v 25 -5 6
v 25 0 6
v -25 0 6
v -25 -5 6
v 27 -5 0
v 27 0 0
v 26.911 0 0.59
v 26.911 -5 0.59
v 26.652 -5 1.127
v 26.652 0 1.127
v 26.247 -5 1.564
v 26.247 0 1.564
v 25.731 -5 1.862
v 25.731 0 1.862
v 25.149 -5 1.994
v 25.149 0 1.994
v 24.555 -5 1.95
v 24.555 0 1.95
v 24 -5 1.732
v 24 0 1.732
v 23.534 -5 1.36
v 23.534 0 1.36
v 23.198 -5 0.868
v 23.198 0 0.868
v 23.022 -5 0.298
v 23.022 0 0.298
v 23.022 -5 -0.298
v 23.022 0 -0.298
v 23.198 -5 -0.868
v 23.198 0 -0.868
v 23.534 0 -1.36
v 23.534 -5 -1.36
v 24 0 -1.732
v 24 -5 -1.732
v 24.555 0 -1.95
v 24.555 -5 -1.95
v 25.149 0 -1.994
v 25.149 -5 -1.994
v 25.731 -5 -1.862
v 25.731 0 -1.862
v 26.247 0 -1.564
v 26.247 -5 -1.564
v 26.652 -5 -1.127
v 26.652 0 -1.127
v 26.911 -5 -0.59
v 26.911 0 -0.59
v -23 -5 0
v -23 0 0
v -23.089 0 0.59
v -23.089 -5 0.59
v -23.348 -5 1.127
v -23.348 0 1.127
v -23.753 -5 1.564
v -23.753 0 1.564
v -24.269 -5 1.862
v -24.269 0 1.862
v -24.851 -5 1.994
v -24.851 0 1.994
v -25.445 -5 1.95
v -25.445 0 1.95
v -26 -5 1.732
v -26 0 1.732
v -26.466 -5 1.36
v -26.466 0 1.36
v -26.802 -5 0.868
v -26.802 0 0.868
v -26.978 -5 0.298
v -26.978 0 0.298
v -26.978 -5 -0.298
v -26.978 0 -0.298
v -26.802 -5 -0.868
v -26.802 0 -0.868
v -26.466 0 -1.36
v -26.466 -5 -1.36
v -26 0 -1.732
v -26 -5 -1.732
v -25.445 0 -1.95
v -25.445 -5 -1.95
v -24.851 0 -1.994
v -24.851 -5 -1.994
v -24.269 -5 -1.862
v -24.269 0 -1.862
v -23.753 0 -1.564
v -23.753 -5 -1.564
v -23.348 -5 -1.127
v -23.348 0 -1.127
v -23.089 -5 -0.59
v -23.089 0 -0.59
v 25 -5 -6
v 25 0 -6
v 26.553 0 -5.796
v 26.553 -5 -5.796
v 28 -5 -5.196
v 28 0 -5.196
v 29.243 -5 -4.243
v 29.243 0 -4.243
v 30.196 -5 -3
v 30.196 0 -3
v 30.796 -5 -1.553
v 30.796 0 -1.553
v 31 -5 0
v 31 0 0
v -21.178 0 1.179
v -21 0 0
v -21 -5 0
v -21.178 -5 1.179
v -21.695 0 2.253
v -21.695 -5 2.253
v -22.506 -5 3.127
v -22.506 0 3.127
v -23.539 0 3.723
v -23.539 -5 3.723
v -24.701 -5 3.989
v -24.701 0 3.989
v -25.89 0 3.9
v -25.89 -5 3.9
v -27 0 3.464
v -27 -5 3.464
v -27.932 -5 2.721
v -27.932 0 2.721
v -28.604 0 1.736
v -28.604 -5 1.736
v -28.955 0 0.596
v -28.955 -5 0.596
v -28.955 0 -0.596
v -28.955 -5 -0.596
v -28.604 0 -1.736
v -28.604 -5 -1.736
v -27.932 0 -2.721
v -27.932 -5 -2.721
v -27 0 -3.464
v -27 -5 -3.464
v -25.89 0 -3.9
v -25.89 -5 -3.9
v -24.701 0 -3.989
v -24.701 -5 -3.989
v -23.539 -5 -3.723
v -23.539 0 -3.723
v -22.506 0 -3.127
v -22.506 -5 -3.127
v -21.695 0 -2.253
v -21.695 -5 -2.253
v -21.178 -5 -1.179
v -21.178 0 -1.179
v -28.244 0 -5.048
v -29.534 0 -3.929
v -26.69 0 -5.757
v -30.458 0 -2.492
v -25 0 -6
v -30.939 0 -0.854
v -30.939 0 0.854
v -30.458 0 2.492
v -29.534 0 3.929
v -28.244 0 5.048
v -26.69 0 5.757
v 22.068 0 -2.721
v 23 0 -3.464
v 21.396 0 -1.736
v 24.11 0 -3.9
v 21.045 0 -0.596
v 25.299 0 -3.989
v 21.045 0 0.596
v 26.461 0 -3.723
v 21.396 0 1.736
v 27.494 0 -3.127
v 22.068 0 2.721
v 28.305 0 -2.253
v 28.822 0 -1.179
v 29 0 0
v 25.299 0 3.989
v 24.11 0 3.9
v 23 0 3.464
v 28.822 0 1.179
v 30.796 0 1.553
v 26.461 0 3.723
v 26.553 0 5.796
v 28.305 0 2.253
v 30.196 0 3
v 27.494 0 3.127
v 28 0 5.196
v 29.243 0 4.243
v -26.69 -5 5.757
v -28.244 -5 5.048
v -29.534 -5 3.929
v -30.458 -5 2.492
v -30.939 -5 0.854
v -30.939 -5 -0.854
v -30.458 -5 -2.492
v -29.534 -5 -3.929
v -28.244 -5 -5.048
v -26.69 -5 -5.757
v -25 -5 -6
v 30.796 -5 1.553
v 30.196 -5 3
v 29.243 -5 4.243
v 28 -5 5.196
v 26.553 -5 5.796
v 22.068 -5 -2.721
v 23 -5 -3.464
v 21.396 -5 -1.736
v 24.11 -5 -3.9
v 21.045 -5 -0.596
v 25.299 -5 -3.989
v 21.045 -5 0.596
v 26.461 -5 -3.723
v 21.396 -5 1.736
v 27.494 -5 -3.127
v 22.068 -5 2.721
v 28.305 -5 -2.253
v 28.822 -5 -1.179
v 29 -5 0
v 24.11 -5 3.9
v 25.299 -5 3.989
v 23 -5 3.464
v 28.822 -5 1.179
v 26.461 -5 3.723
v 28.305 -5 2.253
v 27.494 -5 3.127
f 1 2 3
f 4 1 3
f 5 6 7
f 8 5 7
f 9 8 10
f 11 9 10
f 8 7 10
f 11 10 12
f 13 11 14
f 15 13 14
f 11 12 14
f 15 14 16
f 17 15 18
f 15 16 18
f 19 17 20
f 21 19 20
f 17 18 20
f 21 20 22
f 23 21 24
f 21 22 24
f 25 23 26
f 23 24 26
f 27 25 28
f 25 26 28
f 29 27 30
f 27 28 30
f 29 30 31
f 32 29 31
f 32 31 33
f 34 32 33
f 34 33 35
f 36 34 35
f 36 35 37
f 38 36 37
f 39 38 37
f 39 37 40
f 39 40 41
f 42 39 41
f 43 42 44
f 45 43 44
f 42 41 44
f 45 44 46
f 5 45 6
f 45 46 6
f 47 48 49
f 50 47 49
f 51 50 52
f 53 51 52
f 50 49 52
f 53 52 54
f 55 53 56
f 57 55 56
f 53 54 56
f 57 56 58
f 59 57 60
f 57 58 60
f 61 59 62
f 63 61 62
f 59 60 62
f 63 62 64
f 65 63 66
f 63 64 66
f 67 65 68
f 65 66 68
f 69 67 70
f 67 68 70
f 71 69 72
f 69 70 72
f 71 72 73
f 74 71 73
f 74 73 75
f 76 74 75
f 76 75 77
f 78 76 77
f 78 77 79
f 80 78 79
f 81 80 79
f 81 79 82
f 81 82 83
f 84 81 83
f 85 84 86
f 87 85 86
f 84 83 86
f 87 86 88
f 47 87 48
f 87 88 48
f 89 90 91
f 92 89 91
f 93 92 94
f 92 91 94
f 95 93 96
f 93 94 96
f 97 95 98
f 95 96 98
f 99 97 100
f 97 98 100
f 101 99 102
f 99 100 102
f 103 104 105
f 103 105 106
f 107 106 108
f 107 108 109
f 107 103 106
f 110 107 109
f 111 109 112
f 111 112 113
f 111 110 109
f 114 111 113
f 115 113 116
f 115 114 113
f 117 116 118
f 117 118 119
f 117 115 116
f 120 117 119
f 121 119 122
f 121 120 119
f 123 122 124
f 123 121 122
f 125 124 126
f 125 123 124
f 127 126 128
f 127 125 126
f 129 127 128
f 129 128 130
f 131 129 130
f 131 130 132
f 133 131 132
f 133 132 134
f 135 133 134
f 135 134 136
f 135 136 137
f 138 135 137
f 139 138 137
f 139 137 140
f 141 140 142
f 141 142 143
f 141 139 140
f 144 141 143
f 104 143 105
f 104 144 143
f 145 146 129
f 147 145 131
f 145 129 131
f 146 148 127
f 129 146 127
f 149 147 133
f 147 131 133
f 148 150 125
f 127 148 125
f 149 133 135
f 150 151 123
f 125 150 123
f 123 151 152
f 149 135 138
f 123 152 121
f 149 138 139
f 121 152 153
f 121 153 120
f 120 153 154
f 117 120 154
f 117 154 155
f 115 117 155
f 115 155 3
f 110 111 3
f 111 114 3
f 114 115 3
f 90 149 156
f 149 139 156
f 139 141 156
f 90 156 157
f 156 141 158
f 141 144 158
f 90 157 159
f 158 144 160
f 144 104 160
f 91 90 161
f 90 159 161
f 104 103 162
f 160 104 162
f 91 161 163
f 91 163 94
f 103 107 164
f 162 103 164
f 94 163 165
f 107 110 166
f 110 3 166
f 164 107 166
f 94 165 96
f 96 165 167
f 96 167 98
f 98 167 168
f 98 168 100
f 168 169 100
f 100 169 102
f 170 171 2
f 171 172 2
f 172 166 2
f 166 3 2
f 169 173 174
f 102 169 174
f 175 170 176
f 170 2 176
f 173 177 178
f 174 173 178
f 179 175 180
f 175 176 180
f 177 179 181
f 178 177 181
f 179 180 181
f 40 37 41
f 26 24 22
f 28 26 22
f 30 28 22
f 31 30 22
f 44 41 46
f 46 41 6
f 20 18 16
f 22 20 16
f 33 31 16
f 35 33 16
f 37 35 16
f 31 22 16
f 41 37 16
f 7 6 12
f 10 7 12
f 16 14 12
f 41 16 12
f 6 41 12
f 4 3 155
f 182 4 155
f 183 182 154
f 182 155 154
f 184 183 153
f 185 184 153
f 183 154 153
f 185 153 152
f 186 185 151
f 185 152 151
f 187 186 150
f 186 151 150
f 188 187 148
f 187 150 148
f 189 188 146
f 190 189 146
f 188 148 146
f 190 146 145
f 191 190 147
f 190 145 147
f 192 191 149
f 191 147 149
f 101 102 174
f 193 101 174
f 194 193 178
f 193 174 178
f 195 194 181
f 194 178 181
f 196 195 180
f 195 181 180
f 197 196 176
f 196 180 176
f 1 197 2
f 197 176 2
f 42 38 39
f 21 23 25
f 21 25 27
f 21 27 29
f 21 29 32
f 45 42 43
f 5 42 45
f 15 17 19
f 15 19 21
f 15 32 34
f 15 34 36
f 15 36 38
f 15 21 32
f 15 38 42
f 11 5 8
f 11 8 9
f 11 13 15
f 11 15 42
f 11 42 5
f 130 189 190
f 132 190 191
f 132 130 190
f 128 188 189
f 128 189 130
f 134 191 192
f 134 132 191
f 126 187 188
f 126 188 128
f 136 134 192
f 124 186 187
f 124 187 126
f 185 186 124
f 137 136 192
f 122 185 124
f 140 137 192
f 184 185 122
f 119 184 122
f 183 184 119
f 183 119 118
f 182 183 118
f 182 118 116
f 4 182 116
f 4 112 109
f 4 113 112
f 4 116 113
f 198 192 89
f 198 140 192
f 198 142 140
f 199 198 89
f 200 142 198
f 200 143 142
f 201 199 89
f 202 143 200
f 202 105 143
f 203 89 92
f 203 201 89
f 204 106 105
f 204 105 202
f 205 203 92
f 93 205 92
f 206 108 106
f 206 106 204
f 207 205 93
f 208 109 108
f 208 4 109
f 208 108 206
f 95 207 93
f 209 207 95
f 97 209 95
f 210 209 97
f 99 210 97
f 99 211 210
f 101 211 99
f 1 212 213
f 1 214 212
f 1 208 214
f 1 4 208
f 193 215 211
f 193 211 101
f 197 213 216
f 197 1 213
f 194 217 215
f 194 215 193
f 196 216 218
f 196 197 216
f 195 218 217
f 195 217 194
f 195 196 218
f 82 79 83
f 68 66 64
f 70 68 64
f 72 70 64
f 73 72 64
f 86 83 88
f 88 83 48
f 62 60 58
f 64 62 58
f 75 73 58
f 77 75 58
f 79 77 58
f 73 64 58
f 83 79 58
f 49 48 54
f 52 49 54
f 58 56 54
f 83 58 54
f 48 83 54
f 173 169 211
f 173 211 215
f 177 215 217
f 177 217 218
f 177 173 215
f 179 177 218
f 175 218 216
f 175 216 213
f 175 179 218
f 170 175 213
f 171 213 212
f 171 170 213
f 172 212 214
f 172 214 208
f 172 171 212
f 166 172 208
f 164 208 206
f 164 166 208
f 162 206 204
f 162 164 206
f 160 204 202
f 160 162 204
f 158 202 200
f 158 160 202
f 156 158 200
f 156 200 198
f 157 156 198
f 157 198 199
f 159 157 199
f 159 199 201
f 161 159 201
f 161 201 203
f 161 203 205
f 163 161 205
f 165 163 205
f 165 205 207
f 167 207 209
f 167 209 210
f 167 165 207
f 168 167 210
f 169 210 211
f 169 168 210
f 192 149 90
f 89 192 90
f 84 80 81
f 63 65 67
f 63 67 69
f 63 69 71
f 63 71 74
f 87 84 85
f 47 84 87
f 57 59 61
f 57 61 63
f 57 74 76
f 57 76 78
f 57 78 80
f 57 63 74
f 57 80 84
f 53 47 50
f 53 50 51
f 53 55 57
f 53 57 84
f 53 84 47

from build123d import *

# Parameters (mm, degrees)
F0_R     = 4
F1_DEPTH = 5
F0_R_2   = 2


with BuildPart() as f1:
    # F0 (on Front) → F1 (new body)
    with BuildSketch(Plane.XZ):
        with BuildLine():
            ThreePointArc((-25, 6), (-20.7573593129, 4.2426406871), (-19, 0))
            ThreePointArc((-19, 0), (-20.7573593129, -4.2426406871), (-25, -6))
            Line((-25, -6), (0, -6))
            Line((0, -6), (25, -6))
            ThreePointArc((25, -6), (19, 0), (25, 6))
            Line((25, 6), (0, 6))
            Line((0, 6), (-25, 6))
        make_face()
        with BuildLine():
            ThreePointArc((-25, -6), (-20.7573593129, -4.2426406871), (-19, 0))
            ThreePointArc((-19, 0), (-20.7573593129, 4.2426406871), (-25, 6))
            ThreePointArc((-25, 6), (-31, 0), (-25, -6))
        make_face()
        with Locations((-25, 0)):
            Circle(F0_R, mode=Mode.SUBTRACT)
        with BuildLine():
            ThreePointArc((31, 0), (29.2426406871, 4.2426406871), (25, 6))
            ThreePointArc((25, 6), (19, 0), (25, -6))
            ThreePointArc((25, -6), (29.2426406871, -4.2426406871), (31, 0))
        make_face()
        with Locations((25, 0)):
            Circle(F0_R, mode=Mode.SUBTRACT)
    extrude(amount=F1_DEPTH)


with BuildPart() as f1b:
    # F0 (on Front) → F1, piece 2 (new body)
    with BuildSketch(Plane.XZ):
        with Locations((-25, 0)):
            Circle(F0_R_2)
    extrude(amount=F1_DEPTH)


with BuildPart() as f1c:
    # F0 (on Front) → F1, piece 3 (new body)
    with BuildSketch(Plane.XZ):
        with Locations((25, 0)):
            Circle(F0_R_2)
    extrude(amount=F1_DEPTH)


solid = Compound([f1.part, f1b.part, f1c.part])
